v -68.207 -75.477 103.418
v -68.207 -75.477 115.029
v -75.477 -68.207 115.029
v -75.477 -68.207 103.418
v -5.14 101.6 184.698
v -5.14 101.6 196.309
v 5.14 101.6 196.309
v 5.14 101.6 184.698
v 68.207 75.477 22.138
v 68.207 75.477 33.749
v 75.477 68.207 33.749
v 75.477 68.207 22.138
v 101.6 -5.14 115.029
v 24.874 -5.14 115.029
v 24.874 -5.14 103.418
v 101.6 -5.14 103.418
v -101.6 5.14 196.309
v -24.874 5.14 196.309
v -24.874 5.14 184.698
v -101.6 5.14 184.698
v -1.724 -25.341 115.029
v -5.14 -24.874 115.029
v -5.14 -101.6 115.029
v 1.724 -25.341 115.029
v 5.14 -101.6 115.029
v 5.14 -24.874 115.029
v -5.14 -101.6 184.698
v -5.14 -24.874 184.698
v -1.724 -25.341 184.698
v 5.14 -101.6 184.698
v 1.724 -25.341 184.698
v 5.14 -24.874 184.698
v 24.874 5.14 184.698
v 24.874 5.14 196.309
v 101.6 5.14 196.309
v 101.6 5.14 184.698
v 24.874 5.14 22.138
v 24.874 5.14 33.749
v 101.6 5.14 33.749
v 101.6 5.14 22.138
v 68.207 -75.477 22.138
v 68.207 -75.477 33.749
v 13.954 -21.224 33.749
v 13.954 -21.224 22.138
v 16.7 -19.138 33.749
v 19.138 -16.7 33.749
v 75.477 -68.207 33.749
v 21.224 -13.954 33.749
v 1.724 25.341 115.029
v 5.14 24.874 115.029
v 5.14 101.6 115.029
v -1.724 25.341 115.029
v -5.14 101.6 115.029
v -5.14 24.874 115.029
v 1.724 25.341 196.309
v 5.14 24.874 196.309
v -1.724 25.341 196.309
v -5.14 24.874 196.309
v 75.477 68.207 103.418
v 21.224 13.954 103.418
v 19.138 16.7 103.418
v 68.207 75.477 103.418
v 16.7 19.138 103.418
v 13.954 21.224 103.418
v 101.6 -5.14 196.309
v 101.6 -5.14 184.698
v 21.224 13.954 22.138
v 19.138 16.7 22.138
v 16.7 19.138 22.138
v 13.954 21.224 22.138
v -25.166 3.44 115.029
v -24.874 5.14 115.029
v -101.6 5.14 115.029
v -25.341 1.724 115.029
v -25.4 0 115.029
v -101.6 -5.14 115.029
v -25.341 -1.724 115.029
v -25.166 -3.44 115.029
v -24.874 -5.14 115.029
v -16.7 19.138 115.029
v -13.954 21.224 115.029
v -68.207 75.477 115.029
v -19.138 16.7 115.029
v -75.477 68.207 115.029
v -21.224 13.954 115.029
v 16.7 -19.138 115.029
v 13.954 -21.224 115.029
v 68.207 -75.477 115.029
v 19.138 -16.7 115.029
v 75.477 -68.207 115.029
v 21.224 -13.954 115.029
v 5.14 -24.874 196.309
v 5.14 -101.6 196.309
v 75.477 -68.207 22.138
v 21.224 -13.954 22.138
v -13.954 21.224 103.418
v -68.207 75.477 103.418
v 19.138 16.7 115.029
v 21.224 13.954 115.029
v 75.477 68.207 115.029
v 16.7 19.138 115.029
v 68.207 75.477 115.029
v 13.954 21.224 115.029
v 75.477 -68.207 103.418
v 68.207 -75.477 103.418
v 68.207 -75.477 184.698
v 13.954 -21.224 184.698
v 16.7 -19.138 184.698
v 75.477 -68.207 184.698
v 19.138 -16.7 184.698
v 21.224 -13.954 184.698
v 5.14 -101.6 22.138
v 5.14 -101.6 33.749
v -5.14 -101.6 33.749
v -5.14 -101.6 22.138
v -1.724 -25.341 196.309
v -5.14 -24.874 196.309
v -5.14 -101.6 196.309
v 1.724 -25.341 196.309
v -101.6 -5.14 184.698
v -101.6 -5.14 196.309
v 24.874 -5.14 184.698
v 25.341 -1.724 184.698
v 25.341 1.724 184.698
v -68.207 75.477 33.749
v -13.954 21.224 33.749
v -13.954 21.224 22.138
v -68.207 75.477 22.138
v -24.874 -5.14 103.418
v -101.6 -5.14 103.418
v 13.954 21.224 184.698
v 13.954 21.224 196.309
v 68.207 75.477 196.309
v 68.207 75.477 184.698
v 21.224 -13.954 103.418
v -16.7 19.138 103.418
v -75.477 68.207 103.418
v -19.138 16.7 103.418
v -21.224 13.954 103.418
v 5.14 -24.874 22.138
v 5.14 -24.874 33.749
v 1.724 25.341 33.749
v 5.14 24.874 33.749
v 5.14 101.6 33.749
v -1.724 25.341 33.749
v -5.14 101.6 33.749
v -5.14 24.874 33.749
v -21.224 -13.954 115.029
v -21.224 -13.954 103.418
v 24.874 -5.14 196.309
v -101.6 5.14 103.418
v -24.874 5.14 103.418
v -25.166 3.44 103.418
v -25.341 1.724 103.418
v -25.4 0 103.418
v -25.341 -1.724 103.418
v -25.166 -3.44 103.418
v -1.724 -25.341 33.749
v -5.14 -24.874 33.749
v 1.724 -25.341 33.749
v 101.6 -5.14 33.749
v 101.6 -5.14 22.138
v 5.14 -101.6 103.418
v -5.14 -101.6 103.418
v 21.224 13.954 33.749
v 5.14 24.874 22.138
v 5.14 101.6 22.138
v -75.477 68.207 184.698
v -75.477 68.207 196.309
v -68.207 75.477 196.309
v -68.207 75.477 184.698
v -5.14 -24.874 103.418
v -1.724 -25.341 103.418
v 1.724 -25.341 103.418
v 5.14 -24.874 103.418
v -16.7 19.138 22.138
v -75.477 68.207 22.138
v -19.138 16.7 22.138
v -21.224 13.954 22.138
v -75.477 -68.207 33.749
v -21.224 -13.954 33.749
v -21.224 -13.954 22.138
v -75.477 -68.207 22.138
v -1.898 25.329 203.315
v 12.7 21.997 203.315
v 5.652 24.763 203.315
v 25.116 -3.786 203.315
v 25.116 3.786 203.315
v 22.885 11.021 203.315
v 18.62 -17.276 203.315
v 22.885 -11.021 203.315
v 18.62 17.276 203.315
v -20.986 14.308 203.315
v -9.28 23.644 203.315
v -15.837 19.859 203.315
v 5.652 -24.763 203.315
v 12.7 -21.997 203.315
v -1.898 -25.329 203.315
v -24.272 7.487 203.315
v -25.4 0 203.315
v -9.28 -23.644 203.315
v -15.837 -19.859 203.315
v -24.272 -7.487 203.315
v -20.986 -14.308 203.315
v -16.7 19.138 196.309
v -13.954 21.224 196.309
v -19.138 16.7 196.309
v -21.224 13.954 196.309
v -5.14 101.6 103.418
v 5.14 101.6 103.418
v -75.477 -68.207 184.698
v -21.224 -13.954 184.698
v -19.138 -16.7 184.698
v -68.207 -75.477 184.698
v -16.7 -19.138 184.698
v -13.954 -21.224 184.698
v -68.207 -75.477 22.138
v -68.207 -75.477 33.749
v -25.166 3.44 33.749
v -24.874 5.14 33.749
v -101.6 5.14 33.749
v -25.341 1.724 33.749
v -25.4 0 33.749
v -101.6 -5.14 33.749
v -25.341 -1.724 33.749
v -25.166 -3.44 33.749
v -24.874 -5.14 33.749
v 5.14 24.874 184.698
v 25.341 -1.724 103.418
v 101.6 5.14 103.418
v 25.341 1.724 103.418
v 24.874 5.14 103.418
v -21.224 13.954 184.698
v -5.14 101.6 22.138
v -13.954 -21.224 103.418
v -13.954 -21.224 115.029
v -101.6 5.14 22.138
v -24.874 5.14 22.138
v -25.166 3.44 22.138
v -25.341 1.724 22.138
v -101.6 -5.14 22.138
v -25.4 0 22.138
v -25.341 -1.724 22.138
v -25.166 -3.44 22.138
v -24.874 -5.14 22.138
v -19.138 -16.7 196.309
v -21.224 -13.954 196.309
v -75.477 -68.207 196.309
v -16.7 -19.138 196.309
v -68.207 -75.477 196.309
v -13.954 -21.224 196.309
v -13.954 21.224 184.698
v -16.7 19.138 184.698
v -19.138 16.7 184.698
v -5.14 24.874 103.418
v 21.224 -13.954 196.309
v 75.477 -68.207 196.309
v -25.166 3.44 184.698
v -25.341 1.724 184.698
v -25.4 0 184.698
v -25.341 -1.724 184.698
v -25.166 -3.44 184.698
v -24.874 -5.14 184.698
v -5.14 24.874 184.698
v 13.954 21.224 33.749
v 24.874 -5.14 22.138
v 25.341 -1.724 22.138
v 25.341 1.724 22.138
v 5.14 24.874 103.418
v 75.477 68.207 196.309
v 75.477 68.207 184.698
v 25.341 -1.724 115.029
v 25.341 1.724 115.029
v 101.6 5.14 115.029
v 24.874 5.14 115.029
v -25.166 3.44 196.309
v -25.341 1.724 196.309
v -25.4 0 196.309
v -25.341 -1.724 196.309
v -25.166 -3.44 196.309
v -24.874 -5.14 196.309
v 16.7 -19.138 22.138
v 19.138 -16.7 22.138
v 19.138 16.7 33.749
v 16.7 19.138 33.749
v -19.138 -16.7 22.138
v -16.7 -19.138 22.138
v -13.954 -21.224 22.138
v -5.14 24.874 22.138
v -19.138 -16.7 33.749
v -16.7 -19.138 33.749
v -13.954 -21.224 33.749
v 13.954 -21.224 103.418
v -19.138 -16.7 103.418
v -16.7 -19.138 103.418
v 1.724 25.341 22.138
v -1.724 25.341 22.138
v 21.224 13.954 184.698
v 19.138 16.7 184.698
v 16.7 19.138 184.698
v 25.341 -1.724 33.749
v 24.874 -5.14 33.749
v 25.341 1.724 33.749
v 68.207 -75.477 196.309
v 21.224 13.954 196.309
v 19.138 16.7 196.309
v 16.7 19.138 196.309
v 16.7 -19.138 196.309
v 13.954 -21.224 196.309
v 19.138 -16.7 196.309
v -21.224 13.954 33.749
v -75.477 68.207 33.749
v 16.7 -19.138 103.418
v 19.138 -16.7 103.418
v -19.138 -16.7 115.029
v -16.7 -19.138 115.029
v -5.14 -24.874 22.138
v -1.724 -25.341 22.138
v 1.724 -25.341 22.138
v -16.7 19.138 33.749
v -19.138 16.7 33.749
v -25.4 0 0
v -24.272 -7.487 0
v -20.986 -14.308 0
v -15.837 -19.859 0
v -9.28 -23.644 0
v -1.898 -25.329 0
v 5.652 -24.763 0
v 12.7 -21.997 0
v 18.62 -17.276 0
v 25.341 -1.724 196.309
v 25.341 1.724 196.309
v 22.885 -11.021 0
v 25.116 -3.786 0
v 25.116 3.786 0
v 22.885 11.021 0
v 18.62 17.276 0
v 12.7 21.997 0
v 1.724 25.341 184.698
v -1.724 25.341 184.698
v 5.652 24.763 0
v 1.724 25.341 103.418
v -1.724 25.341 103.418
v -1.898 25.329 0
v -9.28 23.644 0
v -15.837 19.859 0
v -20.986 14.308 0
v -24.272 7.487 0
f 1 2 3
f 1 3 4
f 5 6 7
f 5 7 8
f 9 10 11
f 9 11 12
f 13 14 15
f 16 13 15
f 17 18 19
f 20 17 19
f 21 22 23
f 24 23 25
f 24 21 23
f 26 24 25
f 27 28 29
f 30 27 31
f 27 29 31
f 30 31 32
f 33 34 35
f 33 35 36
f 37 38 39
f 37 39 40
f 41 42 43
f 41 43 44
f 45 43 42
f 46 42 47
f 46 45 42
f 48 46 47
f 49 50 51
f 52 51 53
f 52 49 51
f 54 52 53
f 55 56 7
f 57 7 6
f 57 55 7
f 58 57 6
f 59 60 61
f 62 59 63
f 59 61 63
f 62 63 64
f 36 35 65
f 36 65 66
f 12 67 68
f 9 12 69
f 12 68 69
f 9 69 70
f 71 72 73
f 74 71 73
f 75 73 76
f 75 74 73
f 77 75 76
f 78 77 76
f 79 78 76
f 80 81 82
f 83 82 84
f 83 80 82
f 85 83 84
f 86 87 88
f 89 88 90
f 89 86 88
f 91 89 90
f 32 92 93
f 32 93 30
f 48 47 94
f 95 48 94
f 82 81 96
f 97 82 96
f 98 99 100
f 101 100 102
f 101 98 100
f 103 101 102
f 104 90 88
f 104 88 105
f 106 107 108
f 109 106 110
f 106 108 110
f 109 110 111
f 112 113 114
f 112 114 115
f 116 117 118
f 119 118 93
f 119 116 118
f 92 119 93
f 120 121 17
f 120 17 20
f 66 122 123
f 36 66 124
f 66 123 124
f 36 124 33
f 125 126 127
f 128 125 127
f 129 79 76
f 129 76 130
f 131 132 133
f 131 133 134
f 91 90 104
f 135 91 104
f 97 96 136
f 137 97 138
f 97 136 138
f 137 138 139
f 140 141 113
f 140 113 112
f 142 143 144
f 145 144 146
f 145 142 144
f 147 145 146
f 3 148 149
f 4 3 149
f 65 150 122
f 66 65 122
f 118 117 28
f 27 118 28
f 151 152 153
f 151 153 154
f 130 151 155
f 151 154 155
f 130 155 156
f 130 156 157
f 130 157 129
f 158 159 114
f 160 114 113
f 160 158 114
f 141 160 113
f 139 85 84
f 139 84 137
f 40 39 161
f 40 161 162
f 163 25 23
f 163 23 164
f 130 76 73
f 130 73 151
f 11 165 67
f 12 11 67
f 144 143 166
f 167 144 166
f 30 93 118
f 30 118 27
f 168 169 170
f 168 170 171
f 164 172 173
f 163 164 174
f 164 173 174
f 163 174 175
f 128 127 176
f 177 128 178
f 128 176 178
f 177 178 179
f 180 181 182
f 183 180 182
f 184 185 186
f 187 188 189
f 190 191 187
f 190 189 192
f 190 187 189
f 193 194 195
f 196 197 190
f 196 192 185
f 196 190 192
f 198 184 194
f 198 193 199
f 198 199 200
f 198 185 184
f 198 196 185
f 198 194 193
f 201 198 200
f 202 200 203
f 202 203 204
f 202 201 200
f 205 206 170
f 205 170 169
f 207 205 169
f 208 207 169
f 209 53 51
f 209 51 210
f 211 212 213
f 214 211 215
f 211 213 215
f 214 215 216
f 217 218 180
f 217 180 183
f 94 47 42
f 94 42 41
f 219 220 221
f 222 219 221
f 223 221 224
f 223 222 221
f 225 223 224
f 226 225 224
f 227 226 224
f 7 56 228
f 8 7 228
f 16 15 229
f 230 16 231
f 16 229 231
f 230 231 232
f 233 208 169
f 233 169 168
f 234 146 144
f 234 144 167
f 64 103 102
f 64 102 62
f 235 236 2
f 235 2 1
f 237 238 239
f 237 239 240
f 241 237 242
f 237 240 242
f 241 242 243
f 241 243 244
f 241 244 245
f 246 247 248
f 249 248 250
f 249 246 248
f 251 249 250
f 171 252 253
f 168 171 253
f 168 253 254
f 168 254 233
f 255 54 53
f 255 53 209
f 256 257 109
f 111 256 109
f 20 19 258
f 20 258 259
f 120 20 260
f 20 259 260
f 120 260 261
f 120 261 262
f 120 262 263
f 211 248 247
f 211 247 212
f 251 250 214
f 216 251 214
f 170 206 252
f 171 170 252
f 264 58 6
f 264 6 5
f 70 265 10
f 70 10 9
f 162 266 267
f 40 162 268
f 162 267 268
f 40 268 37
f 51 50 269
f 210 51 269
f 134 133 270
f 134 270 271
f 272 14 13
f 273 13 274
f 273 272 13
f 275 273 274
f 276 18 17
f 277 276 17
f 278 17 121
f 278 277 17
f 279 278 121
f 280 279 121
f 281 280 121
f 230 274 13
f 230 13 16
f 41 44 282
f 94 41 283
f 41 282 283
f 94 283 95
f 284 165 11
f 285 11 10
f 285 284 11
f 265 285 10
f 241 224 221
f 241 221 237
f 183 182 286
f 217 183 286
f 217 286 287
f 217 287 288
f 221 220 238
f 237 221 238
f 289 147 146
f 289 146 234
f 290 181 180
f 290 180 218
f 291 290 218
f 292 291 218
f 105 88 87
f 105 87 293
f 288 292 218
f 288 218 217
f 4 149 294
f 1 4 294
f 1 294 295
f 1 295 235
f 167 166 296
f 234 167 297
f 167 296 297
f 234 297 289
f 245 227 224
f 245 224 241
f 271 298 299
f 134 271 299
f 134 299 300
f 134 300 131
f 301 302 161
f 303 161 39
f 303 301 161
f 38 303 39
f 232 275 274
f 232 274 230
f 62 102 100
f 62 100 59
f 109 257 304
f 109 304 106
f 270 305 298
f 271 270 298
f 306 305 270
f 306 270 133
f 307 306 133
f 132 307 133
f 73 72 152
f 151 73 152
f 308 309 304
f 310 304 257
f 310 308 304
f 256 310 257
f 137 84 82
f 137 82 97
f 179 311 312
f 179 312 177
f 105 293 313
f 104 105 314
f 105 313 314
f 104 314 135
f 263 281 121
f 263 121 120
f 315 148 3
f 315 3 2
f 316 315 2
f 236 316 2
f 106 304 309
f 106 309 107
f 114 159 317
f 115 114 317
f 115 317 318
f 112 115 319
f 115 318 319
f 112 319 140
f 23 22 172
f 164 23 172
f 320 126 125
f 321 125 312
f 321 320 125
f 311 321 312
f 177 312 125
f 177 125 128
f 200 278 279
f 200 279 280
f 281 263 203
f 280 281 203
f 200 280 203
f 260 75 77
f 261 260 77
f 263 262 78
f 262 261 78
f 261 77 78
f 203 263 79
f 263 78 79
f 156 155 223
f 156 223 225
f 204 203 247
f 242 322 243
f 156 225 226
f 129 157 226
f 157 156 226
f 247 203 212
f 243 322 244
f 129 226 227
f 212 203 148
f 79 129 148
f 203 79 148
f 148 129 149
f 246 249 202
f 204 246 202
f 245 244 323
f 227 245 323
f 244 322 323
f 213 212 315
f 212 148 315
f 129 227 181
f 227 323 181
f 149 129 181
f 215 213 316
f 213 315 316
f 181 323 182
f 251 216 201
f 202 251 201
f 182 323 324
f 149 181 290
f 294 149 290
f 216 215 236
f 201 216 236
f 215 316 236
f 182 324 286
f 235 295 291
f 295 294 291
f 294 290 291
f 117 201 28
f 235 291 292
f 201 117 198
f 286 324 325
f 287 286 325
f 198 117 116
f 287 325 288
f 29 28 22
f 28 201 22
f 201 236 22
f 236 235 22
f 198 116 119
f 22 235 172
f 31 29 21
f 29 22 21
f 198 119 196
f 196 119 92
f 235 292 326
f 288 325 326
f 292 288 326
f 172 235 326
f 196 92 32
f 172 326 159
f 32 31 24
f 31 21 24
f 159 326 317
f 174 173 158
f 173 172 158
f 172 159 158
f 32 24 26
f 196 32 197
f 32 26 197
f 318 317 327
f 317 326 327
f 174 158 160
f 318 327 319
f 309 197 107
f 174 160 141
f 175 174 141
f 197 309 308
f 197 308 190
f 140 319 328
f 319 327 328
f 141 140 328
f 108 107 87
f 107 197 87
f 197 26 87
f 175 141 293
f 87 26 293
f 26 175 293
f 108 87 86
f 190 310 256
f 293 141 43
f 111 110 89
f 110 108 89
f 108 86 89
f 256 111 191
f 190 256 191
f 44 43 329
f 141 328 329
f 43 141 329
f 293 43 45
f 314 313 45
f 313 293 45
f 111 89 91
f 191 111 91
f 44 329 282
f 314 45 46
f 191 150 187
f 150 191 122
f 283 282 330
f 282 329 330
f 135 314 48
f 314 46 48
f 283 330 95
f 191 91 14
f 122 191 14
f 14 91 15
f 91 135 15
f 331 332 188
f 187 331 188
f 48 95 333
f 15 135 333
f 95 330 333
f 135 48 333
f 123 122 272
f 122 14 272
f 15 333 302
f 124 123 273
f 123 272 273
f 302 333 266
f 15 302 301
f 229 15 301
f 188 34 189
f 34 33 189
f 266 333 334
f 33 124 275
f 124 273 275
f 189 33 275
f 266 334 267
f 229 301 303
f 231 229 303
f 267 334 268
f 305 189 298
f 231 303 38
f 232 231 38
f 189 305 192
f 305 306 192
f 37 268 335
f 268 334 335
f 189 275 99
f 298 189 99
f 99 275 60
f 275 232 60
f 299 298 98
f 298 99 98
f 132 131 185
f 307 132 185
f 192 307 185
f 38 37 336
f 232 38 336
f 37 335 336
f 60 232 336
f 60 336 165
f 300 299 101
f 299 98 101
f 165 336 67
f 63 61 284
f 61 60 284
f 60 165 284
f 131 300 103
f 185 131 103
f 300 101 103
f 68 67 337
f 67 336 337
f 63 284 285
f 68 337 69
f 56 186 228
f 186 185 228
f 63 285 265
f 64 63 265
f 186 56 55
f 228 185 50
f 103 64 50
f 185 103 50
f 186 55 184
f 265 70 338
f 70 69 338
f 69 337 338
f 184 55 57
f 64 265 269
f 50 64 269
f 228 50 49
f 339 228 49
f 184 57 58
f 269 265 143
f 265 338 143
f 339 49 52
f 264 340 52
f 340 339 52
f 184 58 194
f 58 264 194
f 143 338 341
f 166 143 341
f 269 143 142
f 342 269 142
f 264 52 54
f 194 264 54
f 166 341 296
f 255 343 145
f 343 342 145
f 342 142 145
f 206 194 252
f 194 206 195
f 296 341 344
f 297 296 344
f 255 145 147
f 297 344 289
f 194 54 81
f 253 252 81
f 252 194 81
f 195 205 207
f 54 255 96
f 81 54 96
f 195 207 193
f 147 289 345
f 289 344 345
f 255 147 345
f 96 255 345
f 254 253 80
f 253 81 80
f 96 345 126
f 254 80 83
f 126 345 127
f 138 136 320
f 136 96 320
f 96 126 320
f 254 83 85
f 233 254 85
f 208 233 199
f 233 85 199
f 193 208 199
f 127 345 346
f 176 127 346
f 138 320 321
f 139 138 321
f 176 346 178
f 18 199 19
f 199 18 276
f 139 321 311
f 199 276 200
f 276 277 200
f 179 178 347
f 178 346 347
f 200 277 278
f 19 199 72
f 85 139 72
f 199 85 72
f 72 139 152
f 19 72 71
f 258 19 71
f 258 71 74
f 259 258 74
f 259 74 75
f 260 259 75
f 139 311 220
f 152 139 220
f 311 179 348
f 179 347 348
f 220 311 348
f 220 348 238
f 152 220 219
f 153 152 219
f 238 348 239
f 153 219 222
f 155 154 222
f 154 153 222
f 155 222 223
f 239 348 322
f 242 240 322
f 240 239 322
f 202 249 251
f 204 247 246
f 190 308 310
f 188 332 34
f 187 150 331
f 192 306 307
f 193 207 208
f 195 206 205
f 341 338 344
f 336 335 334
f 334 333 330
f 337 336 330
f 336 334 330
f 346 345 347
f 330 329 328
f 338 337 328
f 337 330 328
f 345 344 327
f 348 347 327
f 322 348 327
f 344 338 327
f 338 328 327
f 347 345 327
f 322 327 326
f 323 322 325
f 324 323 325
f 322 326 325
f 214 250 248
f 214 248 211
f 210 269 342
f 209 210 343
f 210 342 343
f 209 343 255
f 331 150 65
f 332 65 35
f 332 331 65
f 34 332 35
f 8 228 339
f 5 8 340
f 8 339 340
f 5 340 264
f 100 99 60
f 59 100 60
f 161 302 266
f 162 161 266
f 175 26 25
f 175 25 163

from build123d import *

# Parameters (mm, degrees)
SKETCH1_R                  = 25.4
BOSS_EXTRUDE1_DEPTH        = 203.31507114
SKETCH3_W                  = 11.610363297
SKETCH3_H                  = 10.2808948
BOSS_EXTRUDE3_DEPTH        = 101.6
CIRPATTERN4_COUNT          = 8
LPATTERN1_COUNT            = 3
LPATTERN1_PITCH            = 81.28
LPATTERN1_COPY_1_SKETCH_W  = 11.610363297
LPATTERN1_COPY_1_SKETCH_H  = 10.2808948
LPATTERN1_COPY_1_DEPTH     = 101.6
LPATTERN1_COPY_2_SKETCH_W  = 11.610363297
LPATTERN1_COPY_2_SKETCH_H  = 10.2808948
LPATTERN1_COPY_2_DEPTH     = 101.6
LPATTERN1_COPY_3_SKETCH_W  = 11.610363297
LPATTERN1_COPY_3_SKETCH_H  = 10.2808948
LPATTERN1_COPY_3_DEPTH     = 101.6
LPATTERN1_COPY_4_SKETCH_W  = 11.610363297
LPATTERN1_COPY_4_SKETCH_H  = 10.2808948
LPATTERN1_COPY_4_DEPTH     = 101.6
LPATTERN1_COPY_5_SKETCH_W  = 11.610363297
LPATTERN1_COPY_5_SKETCH_H  = 10.2808948
LPATTERN1_COPY_5_DEPTH     = 101.6
LPATTERN1_COPY_6_SKETCH_W  = 11.610363297
LPATTERN1_COPY_6_SKETCH_H  = 10.2808948
LPATTERN1_COPY_6_DEPTH     = 101.6
LPATTERN1_COPY_7_SKETCH_W  = 11.610363297
LPATTERN1_COPY_7_SKETCH_H  = 10.2808948
LPATTERN1_COPY_7_DEPTH     = 101.6
LPATTERN1_COPY_8_SKETCH_W  = 11.610363297
LPATTERN1_COPY_8_SKETCH_H  = 10.2808948
LPATTERN1_COPY_8_DEPTH     = 101.6
LPATTERN1_COPY_9_SKETCH_W  = 11.610363297
LPATTERN1_COPY_9_SKETCH_H  = 10.2808948
LPATTERN1_COPY_9_DEPTH     = 101.6
LPATTERN1_COPY_10_SKETCH_W = 11.610363297
LPATTERN1_COPY_10_SKETCH_H = 10.2808948
LPATTERN1_COPY_10_DEPTH    = 101.6
LPATTERN1_COPY_11_SKETCH_W = 11.610363297
LPATTERN1_COPY_11_SKETCH_H = 10.2808948
LPATTERN1_COPY_11_DEPTH    = 101.6
LPATTERN1_COPY_12_SKETCH_W = 11.610363297
LPATTERN1_COPY_12_SKETCH_H = 10.2808948
LPATTERN1_COPY_12_DEPTH    = 101.6
LPATTERN1_COPY_13_SKETCH_W = 11.610363297
LPATTERN1_COPY_13_SKETCH_H = 10.2808948
LPATTERN1_COPY_13_DEPTH    = 101.6
LPATTERN1_COPY_14_SKETCH_W = 11.610363297
LPATTERN1_COPY_14_SKETCH_H = 10.2808948
LPATTERN1_COPY_14_DEPTH    = 101.6


with BuildPart() as part:
    # Sketch1 → Boss-Extrude1 (new body)
    with BuildSketch(Plane.XY):
        with Locations(Location((0, 0, 0), (0, 0, 180))):
            Circle(SKETCH1_R)
    extrude(amount=BOSS_EXTRUDE1_DEPTH)

    # Sketch3 → Boss-Extrude3 (add)
    with BuildSketch(Plane(origin=(0, 0, 0), x_dir=(0, 0, -1), z_dir=(1, 0, 0))):
        with Locations((-190.503475636, 0)):
            Rectangle(SKETCH3_W, SKETCH3_H)
    boss_extrude3 = extrude(amount=BOSS_EXTRUDE3_DEPTH)

    # CirPattern4: Boss-Extrude3 ×8 about axis
    cirpattern4_axis = Axis((0, 0, 0), (0, 0, 1))
    for i in range(1, CIRPATTERN4_COUNT):
        add(boss_extrude3.rotate(cirpattern4_axis, i * 360 / CIRPATTERN4_COUNT))

    # LPattern1: Boss-Extrude3 ×3
    with Locations(*[(0, 0, -i * LPATTERN1_PITCH) for i in range(1, LPATTERN1_COUNT)]):
        add(boss_extrude3)

    # LPattern1 copy 1 sketch → LPattern1 copy 1 (add)
    with BuildSketch(Plane(origin=(0, 0, -81.28), x_dir=(0, 0, -1), z_dir=(0.7071067811865476, 0.7071067811865475, 0))):
        with Locations((-190.503475636, 0)):
            Rectangle(LPATTERN1_COPY_1_SKETCH_W, LPATTERN1_COPY_1_SKETCH_H)
    extrude(amount=LPATTERN1_COPY_1_DEPTH)

    # LPattern1 copy 2 sketch → LPattern1 copy 2 (add)
    with BuildSketch(Plane(origin=(0, 0, -162.56), x_dir=(0, 0, -1), z_dir=(0.7071067811865476, 0.7071067811865475, 0))):
        with Locations((-190.503475636, 0)):
            Rectangle(LPATTERN1_COPY_2_SKETCH_W, LPATTERN1_COPY_2_SKETCH_H)
    extrude(amount=LPATTERN1_COPY_2_DEPTH)

    # LPattern1 copy 3 sketch → LPattern1 copy 3 (add)
    with BuildSketch(Plane(origin=(0, 0, -81.28), x_dir=(0, 0, -1), z_dir=(0, 1, 0))):
        with Locations((-190.503475636, 0)):
            Rectangle(LPATTERN1_COPY_3_SKETCH_W, LPATTERN1_COPY_3_SKETCH_H)
    extrude(amount=LPATTERN1_COPY_3_DEPTH)

    # LPattern1 copy 4 sketch → LPattern1 copy 4 (add)
    with BuildSketch(Plane(origin=(0, 0, -162.56), x_dir=(0, 0, -1), z_dir=(0, 1, 0))):
        with Locations((-190.503475636, 0)):
            Rectangle(LPATTERN1_COPY_4_SKETCH_W, LPATTERN1_COPY_4_SKETCH_H)
    extrude(amount=LPATTERN1_COPY_4_DEPTH)

    # LPattern1 copy 5 sketch → LPattern1 copy 5 (add)
    with BuildSketch(Plane(origin=(0, 0, -81.28), x_dir=(0, 0, -1), z_dir=(-0.7071067811865475, 0.7071067811865476, 0))):
        with Locations((-190.503475636, 0)):
            Rectangle(LPATTERN1_COPY_5_SKETCH_W, LPATTERN1_COPY_5_SKETCH_H)
    extrude(amount=LPATTERN1_COPY_5_DEPTH)

    # LPattern1 copy 6 sketch → LPattern1 copy 6 (add)
    with BuildSketch(Plane(origin=(0, 0, -162.56), x_dir=(0, 0, -1), z_dir=(-0.7071067811865475, 0.7071067811865476, 0))):
        with Locations((-190.503475636, 0)):
            Rectangle(LPATTERN1_COPY_6_SKETCH_W, LPATTERN1_COPY_6_SKETCH_H)
    extrude(amount=LPATTERN1_COPY_6_DEPTH)

    # LPattern1 copy 7 sketch → LPattern1 copy 7 (add)
    with BuildSketch(Plane(origin=(0, 0, -81.28), x_dir=(0, 0, -1), z_dir=(-1, 0, 0))):
        with Locations((-190.503475636, 0)):
            Rectangle(LPATTERN1_COPY_7_SKETCH_W, LPATTERN1_COPY_7_SKETCH_H)
    extrude(amount=LPATTERN1_COPY_7_DEPTH)

    # LPattern1 copy 8 sketch → LPattern1 copy 8 (add)
    with BuildSketch(Plane(origin=(0, 0, -162.56), x_dir=(0, 0, -1), z_dir=(-1, 0, 0))):
        with Locations((-190.503475636, 0)):
            Rectangle(LPATTERN1_COPY_8_SKETCH_W, LPATTERN1_COPY_8_SKETCH_H)
    extrude(amount=LPATTERN1_COPY_8_DEPTH)

    # LPattern1 copy 9 sketch → LPattern1 copy 9 (add)
    with BuildSketch(Plane(origin=(0, 0, -81.28), x_dir=(0, 0, -1), z_dir=(-0.7071067811865477, -0.7071067811865475, 0))):
        with Locations((-190.503475636, 0)):
            Rectangle(LPATTERN1_COPY_9_SKETCH_W, LPATTERN1_COPY_9_SKETCH_H)
    extrude(amount=LPATTERN1_COPY_9_DEPTH)

    # LPattern1 copy 10 sketch → LPattern1 copy 10 (add)
    with BuildSketch(Plane(origin=(0, 0, -162.56), x_dir=(0, 0, -1), z_dir=(-0.7071067811865477, -0.7071067811865475, 0))):
        with Locations((-190.503475636, 0)):
            Rectangle(LPATTERN1_COPY_10_SKETCH_W, LPATTERN1_COPY_10_SKETCH_H)
    extrude(amount=LPATTERN1_COPY_10_DEPTH)

    # LPattern1 copy 11 sketch → LPattern1 copy 11 (add)
    with BuildSketch(Plane(origin=(0, 0, -81.28), x_dir=(0, 0, -1), z_dir=(0, -1, 0))):
        with Locations((-190.503475636, 0)):
            Rectangle(LPATTERN1_COPY_11_SKETCH_W, LPATTERN1_COPY_11_SKETCH_H)
    extrude(amount=LPATTERN1_COPY_11_DEPTH)

    # LPattern1 copy 12 sketch → LPattern1 copy 12 (add)
    with BuildSketch(Plane(origin=(0, 0, -162.56), x_dir=(0, 0, -1), z_dir=(0, -1, 0))):
        with Locations((-190.503475636, 0)):
            Rectangle(LPATTERN1_COPY_12_SKETCH_W, LPATTERN1_COPY_12_SKETCH_H)
    extrude(amount=LPATTERN1_COPY_12_DEPTH)

    # LPattern1 copy 13 sketch → LPattern1 copy 13 (add)
    with BuildSketch(Plane(origin=(0, 0, -81.28), x_dir=(0, 0, -1), z_dir=(0.7071067811865474, -0.7071067811865477, 0))):
        with Locations((-190.503475636, 0)):
            Rectangle(LPATTERN1_COPY_13_SKETCH_W, LPATTERN1_COPY_13_SKETCH_H)
    extrude(amount=LPATTERN1_COPY_13_DEPTH)

    # LPattern1 copy 14 sketch → LPattern1 copy 14 (add)
    with BuildSketch(Plane(origin=(0, 0, -162.56), x_dir=(0, 0, -1), z_dir=(0.7071067811865474, -0.7071067811865477, 0))):
        with Locations((-190.503475636, 0)):
            Rectangle(LPATTERN1_COPY_14_SKETCH_W, LPATTERN1_COPY_14_SKETCH_H)
    extrude(amount=LPATTERN1_COPY_14_DEPTH)


solid = part.part
